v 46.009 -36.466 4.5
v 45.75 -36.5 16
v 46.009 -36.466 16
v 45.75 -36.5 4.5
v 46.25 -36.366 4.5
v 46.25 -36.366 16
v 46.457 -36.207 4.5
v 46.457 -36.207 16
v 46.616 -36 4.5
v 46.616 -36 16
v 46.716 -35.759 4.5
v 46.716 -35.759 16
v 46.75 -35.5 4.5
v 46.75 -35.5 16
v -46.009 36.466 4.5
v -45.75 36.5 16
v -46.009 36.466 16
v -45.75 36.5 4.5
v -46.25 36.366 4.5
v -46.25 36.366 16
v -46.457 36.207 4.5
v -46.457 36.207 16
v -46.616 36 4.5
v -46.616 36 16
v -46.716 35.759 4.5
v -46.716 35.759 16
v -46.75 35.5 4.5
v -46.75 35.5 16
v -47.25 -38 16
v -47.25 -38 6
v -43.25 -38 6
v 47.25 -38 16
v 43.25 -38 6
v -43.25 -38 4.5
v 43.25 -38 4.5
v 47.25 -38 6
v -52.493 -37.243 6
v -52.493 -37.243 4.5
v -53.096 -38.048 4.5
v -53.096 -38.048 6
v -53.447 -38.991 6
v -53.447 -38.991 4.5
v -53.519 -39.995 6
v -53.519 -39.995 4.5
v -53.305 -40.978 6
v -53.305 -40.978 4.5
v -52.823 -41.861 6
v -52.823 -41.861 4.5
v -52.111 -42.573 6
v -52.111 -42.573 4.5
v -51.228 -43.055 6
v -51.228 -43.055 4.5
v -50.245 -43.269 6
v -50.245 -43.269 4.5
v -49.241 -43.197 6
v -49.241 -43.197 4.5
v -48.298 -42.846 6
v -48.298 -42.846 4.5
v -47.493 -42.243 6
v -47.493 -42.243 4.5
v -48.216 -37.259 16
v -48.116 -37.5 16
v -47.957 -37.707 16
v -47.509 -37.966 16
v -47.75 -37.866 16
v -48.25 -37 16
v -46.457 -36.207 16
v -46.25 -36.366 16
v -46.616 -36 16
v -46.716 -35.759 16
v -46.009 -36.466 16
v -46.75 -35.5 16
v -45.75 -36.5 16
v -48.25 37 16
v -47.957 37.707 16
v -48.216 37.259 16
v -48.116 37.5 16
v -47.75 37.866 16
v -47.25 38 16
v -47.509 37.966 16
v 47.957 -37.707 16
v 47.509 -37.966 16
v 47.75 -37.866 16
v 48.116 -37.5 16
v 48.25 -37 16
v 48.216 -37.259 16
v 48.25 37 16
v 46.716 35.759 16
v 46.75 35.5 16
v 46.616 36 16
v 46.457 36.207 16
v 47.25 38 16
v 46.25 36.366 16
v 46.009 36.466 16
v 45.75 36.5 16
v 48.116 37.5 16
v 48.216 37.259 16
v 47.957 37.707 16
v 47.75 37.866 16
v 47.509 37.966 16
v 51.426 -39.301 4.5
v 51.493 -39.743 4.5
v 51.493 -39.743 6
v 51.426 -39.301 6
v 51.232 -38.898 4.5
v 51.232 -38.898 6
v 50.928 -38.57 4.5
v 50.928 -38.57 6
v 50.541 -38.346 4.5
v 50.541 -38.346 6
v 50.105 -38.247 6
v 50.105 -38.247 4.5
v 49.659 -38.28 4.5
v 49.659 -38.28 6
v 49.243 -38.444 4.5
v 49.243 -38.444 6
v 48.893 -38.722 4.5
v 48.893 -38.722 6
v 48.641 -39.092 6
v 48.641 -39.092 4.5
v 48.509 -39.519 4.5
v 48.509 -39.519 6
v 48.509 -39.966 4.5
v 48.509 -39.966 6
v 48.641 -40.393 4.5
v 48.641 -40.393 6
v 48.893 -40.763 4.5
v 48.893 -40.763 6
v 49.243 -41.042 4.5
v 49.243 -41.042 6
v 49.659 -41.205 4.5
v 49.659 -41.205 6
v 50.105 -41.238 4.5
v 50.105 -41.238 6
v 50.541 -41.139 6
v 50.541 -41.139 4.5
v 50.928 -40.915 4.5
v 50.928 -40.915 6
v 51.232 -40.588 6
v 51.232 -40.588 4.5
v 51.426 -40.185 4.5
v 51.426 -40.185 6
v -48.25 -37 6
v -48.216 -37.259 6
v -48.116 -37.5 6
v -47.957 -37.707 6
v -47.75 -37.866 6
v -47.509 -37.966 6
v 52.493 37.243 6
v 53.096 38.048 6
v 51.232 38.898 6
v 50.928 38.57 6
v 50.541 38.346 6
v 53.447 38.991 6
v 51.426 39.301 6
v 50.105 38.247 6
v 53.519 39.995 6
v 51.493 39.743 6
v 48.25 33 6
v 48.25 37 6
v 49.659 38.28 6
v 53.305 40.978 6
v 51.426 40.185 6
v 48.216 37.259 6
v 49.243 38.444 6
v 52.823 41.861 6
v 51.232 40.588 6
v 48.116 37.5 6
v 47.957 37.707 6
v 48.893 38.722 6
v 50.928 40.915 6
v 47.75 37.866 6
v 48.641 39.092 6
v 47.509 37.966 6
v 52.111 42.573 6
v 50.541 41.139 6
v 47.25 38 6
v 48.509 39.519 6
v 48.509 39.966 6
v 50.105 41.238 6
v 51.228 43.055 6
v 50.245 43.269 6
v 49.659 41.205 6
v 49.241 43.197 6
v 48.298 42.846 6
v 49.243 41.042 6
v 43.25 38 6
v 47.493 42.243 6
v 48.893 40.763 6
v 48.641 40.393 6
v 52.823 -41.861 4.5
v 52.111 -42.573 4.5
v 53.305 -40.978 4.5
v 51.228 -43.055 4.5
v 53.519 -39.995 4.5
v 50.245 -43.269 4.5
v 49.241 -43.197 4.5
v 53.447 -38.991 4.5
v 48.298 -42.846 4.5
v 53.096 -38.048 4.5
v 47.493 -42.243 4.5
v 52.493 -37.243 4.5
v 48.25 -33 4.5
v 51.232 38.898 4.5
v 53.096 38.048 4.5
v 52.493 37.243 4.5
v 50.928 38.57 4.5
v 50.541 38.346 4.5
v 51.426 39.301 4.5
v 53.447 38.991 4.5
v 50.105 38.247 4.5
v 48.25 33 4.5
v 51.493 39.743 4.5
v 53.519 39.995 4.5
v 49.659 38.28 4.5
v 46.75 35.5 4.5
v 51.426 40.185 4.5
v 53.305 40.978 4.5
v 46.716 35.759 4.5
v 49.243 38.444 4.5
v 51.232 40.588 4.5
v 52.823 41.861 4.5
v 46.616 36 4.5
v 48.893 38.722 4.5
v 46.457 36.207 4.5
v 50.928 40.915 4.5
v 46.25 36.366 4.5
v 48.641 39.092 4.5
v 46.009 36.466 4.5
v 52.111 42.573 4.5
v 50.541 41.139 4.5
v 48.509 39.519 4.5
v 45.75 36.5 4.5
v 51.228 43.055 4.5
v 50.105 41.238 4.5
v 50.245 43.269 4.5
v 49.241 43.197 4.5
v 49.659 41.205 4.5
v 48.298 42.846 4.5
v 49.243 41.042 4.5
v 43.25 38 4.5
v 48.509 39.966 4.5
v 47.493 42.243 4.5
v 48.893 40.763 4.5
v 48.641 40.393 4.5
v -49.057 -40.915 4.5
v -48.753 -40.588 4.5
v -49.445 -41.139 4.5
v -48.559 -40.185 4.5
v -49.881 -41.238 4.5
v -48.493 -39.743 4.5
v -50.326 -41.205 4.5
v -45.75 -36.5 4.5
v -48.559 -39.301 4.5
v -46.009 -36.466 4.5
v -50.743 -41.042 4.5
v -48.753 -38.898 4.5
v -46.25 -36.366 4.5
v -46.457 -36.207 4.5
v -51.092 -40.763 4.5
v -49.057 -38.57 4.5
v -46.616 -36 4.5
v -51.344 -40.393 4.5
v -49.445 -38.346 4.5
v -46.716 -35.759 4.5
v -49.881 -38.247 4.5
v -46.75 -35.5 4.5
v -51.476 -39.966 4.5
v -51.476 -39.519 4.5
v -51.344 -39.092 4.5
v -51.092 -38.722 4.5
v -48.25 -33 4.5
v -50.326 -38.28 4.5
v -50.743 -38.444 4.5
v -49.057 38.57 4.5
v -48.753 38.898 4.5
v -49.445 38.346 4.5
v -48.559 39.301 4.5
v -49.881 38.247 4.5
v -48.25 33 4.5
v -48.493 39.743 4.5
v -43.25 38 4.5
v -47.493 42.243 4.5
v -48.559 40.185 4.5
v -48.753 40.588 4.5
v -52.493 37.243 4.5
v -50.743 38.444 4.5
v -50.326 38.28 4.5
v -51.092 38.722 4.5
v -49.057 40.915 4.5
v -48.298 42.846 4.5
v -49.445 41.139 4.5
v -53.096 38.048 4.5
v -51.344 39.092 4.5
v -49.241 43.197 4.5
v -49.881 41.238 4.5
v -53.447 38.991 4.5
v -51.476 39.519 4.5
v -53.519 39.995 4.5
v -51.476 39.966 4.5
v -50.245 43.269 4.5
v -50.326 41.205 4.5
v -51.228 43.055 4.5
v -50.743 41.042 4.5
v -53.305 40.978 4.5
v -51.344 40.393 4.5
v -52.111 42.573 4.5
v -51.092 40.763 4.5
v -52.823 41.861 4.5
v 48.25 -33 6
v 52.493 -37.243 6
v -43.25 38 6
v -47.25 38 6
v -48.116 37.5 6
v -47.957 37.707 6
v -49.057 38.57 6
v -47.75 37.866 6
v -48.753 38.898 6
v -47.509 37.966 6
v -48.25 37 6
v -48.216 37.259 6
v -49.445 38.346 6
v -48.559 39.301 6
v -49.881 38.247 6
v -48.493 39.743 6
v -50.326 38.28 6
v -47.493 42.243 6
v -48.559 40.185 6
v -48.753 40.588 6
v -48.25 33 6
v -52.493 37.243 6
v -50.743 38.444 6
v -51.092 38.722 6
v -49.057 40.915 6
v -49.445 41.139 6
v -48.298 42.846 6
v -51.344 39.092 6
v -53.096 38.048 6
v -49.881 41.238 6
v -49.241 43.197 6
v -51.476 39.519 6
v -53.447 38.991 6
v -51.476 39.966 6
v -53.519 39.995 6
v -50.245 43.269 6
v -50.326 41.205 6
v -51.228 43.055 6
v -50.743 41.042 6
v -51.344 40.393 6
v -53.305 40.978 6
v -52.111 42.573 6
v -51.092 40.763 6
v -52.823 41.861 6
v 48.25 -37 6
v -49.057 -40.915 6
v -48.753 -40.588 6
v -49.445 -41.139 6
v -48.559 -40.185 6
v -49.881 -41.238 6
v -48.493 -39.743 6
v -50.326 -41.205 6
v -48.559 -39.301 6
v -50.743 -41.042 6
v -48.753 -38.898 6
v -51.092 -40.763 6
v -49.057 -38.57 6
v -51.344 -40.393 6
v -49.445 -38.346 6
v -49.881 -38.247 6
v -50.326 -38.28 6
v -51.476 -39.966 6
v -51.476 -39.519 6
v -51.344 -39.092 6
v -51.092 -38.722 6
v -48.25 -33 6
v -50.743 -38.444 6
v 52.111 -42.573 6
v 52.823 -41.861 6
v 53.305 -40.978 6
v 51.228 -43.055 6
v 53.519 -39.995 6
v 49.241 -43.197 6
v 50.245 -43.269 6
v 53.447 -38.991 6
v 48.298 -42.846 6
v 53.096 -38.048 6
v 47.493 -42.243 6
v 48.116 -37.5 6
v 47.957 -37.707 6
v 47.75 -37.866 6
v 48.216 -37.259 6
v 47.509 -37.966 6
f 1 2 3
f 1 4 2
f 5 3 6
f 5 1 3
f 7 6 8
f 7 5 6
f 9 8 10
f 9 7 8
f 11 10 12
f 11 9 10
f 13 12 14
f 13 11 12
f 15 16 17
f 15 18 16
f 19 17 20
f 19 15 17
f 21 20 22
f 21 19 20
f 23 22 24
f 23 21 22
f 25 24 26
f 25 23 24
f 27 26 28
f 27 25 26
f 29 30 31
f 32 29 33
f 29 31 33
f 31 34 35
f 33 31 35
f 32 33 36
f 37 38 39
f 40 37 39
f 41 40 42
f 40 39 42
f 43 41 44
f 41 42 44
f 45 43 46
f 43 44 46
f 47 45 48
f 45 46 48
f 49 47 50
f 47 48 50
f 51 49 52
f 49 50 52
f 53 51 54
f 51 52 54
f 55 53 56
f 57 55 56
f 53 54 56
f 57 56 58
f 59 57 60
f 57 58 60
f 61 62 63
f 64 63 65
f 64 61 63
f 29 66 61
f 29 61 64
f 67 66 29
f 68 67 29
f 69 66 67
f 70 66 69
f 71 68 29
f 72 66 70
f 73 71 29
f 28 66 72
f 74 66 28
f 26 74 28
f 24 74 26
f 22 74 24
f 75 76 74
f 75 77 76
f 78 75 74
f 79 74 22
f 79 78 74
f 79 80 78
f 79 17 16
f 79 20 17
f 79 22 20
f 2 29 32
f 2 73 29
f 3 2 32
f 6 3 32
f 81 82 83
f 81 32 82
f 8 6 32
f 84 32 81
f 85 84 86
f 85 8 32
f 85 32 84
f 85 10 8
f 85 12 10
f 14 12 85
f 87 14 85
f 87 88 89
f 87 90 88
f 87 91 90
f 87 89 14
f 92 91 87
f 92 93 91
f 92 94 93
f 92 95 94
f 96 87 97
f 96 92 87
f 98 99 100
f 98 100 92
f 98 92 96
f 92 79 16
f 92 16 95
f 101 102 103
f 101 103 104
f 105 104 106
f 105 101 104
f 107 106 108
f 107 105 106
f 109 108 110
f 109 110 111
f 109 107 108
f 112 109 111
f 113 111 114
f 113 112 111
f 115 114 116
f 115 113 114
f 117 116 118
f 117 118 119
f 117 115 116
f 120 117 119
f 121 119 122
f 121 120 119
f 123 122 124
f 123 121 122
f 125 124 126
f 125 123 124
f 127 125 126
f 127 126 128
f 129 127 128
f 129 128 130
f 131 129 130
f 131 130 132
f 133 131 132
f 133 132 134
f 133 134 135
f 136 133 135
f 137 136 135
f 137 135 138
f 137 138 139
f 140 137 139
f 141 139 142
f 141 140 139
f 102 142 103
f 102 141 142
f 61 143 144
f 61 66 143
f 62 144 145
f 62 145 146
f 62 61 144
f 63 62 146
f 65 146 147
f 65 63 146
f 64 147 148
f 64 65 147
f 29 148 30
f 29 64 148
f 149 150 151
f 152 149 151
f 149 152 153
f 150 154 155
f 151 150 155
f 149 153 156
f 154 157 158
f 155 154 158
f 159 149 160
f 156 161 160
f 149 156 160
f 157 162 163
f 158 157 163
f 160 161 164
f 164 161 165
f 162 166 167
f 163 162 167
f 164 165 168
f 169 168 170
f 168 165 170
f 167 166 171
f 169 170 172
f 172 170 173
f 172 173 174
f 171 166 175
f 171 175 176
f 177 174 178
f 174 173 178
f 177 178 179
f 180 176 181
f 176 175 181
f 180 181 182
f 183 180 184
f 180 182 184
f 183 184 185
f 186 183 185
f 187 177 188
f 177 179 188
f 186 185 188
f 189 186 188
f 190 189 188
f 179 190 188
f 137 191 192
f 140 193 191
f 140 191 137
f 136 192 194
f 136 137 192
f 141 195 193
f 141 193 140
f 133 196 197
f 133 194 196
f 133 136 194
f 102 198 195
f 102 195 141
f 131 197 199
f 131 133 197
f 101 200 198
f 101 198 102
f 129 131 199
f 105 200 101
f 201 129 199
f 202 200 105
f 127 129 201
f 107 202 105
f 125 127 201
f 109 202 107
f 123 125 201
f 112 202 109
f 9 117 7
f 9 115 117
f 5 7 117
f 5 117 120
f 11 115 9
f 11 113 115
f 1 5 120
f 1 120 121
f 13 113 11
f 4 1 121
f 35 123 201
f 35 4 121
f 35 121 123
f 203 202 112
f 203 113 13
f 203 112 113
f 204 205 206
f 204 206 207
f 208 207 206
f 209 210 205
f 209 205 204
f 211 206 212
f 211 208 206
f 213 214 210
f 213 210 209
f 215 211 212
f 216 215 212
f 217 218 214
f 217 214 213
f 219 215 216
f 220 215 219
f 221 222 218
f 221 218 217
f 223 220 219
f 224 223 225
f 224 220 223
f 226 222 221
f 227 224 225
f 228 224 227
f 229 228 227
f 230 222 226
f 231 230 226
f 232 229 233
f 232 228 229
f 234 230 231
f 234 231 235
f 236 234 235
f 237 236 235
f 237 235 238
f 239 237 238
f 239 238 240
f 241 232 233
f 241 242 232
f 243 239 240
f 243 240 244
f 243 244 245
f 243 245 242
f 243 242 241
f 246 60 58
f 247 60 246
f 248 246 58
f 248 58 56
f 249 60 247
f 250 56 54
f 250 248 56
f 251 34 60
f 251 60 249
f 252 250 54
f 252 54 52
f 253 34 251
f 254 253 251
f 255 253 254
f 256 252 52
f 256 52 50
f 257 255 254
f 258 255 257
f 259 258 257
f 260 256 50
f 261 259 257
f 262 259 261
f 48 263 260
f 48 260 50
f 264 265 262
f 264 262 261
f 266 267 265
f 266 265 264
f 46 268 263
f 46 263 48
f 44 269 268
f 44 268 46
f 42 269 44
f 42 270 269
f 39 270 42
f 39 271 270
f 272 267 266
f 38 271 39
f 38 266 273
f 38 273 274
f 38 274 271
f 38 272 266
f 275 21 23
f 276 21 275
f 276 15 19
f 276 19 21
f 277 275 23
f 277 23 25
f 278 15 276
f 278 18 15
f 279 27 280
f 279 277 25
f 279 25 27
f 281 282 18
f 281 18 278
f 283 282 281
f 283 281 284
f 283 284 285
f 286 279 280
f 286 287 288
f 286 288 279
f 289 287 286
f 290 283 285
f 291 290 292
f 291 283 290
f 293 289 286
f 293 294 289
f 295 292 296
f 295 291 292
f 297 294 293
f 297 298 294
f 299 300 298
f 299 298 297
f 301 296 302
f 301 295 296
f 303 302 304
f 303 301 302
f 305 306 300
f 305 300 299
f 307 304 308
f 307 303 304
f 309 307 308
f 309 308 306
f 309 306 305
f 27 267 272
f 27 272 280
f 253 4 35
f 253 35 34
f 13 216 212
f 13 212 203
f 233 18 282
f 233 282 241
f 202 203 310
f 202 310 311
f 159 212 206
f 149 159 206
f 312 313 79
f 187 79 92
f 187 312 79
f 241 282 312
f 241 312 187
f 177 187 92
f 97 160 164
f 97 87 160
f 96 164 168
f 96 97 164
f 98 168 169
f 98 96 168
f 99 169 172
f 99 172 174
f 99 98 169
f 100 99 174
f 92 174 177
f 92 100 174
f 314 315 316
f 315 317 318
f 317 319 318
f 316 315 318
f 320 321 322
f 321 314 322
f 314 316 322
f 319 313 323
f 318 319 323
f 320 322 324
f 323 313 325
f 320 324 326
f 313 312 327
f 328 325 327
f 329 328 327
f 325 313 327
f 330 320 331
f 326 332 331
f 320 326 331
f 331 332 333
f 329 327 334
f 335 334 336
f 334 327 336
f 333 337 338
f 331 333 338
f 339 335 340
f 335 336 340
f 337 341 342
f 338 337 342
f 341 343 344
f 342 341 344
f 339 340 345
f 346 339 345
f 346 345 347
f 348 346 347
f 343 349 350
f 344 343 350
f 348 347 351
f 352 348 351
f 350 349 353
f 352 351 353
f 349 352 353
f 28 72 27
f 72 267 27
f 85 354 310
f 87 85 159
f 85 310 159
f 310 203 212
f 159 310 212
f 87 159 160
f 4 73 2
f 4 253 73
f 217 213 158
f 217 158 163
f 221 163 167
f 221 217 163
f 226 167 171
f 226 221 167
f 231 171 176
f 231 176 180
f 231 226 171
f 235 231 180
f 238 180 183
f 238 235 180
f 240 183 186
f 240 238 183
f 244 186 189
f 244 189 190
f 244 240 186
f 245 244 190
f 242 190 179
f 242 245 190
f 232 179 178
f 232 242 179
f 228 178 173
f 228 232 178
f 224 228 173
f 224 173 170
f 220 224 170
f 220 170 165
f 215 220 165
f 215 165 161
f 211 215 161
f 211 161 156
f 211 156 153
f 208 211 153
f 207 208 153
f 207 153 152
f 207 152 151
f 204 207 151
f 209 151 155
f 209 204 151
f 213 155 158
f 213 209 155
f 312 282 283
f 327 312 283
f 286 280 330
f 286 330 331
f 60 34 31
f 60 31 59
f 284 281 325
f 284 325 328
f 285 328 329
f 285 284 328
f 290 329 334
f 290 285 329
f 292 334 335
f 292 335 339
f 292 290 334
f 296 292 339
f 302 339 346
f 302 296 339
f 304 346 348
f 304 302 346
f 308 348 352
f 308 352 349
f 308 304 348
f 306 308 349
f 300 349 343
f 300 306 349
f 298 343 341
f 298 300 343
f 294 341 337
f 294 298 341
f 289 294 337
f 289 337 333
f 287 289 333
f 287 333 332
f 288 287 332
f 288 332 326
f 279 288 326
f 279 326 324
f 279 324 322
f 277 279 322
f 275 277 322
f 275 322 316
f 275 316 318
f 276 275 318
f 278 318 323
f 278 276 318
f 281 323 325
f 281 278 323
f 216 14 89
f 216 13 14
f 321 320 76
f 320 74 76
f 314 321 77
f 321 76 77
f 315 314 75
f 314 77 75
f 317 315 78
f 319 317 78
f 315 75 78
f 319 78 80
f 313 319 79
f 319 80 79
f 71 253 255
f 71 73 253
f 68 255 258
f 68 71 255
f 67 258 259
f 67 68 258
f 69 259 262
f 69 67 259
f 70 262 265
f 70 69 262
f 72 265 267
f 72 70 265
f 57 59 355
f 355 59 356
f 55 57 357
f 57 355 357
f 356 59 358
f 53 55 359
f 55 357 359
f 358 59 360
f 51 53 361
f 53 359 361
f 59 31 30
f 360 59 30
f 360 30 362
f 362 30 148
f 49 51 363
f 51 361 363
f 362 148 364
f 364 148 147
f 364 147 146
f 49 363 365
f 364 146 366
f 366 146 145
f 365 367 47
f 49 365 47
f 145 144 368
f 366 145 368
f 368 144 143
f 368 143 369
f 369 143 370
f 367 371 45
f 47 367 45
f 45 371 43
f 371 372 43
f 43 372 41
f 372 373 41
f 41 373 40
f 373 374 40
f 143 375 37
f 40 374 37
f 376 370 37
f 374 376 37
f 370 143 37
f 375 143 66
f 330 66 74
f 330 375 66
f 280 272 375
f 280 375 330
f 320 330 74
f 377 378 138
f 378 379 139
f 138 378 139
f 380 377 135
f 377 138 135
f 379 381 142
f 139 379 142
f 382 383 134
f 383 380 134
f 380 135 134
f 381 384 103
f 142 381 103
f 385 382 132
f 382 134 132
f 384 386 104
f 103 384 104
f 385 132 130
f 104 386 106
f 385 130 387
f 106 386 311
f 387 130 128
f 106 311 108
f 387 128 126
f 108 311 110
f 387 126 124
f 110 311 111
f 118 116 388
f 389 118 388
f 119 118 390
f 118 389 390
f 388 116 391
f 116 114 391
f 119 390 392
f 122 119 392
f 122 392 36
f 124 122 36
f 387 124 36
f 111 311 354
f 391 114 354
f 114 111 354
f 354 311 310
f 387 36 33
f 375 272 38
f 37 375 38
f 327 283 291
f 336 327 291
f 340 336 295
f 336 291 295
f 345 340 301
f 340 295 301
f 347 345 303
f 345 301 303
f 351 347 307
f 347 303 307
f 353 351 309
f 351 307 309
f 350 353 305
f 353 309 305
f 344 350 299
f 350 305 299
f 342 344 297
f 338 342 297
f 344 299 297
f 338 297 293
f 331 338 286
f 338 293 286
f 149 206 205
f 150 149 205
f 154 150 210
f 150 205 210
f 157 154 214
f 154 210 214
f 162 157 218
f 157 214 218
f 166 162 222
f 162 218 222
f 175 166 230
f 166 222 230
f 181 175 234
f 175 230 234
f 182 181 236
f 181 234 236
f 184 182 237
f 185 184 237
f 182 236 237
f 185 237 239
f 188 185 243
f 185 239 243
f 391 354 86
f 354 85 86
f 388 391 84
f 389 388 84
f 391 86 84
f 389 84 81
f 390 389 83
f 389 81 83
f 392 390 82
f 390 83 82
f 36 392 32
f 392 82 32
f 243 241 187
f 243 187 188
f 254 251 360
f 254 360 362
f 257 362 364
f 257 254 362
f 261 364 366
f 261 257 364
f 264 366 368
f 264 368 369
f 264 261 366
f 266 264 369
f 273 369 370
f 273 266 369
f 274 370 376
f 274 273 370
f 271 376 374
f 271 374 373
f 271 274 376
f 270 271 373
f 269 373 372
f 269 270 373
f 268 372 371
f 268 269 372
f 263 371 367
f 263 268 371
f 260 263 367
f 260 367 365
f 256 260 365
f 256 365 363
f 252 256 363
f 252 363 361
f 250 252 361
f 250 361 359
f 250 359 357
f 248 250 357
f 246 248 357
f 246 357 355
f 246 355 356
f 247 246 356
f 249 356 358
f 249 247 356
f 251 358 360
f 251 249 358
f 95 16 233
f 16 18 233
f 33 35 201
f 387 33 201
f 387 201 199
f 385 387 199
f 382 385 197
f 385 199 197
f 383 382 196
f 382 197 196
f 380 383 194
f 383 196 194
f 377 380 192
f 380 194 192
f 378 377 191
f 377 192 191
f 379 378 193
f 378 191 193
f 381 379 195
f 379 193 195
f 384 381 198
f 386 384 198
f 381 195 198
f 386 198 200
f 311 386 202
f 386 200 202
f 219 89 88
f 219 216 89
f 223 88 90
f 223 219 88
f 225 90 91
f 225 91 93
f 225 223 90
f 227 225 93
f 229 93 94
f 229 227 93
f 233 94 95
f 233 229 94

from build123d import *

# Parameters (mm, degrees)
SKETCH007_R   = 1.5
SKETCH007_W   = 93.5
SKETCH007_H   = 73
PAD004_DEPTH  = 1.5
SKETCH008_W   = 96.5
SKETCH008_H   = 76
SKETCH008_W_2 = 93.5
SKETCH008_H_2 = 73
PAD005_DEPTH  = 10
FILLET005_R   = 1


with BuildPart() as part:
    # Sketch007 → Pad004 (new body)
    with BuildSketch(Plane.XY):
        with BuildLine():
            Line((-48.25, -33), (-48.25, 33))
            Line((-48.25, 33), (-52.492641, 37.242641))
            ThreePointArc((-47.492641, 42.242641), (-52.492641, 42.242641), (-52.492641, 37.242641))
            Line((-43.25, 38), (-47.492641, 42.242641))
            Line((-43.25, 38), (43.25, 38))
            Line((43.25, 38), (47.492641, 42.242641))
            ThreePointArc((52.492641, 37.242641), (52.492641, 42.242641), (47.492641, 42.242641))
            Line((48.25, 33), (52.492641, 37.242641))
            Line((48.25, 33), (48.25, -33))
            Line((48.25, -33), (52.492641, -37.242641))
            ThreePointArc((47.492641, -42.242641), (52.492641, -42.242641), (52.492641, -37.242641))
            Line((43.25, -38), (47.492641, -42.242641))
            Line((43.25, -38), (-43.25, -38))
            Line((-43.25, -38), (-47.492641, -42.242641))
            ThreePointArc((-52.492641, -37.242641), (-52.492641, -42.242641), (-47.492641, -42.242641))
            Line((-48.25, -33), (-52.492641, -37.242641))
        make_face()
        with Locations((49.992641, -39.742641)):
            Circle(SKETCH007_R, mode=Mode.SUBTRACT)
        with Locations((-49.992641, -39.742641)):
            Circle(SKETCH007_R, mode=Mode.SUBTRACT)
        with Locations((-49.992641, 39.742641)):
            Circle(SKETCH007_R, mode=Mode.SUBTRACT)
        with Locations((49.992641, 39.742641)):
            Circle(SKETCH007_R, mode=Mode.SUBTRACT)
        Rectangle(SKETCH007_W, SKETCH007_H, mode=Mode.SUBTRACT)
    extrude(amount=PAD004_DEPTH)

    # Sketch008 (on Face26 of Pad004) → Pad005 (join)
    with BuildSketch(Plane.XY.offset(1.5)):
        Rectangle(SKETCH008_W, SKETCH008_H)
        Rectangle(SKETCH008_W_2, SKETCH008_H_2, mode=Mode.SUBTRACT)
    extrude(amount=PAD005_DEPTH)

    # Fillet005
    fillet005_edges = [part.edges().sort_by_distance(p)[0] for p in [
        (48.25, -38, 6.5),
        (-48.25, -38, 6.5),
        (48.25, 38, 6.5),
        (-48.25, 38, 6.5),
        (46.75, -36.5, 6.5),
        (-46.75, 36.5, 6.5),
        (46.75, 36.5, 6.5),
        (-46.75, -36.5, 6.5),
    ]]
    fillet(fillet005_edges, radius=FILLET005_R)


with BuildPart() as part_1:
    # Body003 placement: moved
    add(part.part.moved(Location((0, 0, 4.5))))


solid = part_1.part
